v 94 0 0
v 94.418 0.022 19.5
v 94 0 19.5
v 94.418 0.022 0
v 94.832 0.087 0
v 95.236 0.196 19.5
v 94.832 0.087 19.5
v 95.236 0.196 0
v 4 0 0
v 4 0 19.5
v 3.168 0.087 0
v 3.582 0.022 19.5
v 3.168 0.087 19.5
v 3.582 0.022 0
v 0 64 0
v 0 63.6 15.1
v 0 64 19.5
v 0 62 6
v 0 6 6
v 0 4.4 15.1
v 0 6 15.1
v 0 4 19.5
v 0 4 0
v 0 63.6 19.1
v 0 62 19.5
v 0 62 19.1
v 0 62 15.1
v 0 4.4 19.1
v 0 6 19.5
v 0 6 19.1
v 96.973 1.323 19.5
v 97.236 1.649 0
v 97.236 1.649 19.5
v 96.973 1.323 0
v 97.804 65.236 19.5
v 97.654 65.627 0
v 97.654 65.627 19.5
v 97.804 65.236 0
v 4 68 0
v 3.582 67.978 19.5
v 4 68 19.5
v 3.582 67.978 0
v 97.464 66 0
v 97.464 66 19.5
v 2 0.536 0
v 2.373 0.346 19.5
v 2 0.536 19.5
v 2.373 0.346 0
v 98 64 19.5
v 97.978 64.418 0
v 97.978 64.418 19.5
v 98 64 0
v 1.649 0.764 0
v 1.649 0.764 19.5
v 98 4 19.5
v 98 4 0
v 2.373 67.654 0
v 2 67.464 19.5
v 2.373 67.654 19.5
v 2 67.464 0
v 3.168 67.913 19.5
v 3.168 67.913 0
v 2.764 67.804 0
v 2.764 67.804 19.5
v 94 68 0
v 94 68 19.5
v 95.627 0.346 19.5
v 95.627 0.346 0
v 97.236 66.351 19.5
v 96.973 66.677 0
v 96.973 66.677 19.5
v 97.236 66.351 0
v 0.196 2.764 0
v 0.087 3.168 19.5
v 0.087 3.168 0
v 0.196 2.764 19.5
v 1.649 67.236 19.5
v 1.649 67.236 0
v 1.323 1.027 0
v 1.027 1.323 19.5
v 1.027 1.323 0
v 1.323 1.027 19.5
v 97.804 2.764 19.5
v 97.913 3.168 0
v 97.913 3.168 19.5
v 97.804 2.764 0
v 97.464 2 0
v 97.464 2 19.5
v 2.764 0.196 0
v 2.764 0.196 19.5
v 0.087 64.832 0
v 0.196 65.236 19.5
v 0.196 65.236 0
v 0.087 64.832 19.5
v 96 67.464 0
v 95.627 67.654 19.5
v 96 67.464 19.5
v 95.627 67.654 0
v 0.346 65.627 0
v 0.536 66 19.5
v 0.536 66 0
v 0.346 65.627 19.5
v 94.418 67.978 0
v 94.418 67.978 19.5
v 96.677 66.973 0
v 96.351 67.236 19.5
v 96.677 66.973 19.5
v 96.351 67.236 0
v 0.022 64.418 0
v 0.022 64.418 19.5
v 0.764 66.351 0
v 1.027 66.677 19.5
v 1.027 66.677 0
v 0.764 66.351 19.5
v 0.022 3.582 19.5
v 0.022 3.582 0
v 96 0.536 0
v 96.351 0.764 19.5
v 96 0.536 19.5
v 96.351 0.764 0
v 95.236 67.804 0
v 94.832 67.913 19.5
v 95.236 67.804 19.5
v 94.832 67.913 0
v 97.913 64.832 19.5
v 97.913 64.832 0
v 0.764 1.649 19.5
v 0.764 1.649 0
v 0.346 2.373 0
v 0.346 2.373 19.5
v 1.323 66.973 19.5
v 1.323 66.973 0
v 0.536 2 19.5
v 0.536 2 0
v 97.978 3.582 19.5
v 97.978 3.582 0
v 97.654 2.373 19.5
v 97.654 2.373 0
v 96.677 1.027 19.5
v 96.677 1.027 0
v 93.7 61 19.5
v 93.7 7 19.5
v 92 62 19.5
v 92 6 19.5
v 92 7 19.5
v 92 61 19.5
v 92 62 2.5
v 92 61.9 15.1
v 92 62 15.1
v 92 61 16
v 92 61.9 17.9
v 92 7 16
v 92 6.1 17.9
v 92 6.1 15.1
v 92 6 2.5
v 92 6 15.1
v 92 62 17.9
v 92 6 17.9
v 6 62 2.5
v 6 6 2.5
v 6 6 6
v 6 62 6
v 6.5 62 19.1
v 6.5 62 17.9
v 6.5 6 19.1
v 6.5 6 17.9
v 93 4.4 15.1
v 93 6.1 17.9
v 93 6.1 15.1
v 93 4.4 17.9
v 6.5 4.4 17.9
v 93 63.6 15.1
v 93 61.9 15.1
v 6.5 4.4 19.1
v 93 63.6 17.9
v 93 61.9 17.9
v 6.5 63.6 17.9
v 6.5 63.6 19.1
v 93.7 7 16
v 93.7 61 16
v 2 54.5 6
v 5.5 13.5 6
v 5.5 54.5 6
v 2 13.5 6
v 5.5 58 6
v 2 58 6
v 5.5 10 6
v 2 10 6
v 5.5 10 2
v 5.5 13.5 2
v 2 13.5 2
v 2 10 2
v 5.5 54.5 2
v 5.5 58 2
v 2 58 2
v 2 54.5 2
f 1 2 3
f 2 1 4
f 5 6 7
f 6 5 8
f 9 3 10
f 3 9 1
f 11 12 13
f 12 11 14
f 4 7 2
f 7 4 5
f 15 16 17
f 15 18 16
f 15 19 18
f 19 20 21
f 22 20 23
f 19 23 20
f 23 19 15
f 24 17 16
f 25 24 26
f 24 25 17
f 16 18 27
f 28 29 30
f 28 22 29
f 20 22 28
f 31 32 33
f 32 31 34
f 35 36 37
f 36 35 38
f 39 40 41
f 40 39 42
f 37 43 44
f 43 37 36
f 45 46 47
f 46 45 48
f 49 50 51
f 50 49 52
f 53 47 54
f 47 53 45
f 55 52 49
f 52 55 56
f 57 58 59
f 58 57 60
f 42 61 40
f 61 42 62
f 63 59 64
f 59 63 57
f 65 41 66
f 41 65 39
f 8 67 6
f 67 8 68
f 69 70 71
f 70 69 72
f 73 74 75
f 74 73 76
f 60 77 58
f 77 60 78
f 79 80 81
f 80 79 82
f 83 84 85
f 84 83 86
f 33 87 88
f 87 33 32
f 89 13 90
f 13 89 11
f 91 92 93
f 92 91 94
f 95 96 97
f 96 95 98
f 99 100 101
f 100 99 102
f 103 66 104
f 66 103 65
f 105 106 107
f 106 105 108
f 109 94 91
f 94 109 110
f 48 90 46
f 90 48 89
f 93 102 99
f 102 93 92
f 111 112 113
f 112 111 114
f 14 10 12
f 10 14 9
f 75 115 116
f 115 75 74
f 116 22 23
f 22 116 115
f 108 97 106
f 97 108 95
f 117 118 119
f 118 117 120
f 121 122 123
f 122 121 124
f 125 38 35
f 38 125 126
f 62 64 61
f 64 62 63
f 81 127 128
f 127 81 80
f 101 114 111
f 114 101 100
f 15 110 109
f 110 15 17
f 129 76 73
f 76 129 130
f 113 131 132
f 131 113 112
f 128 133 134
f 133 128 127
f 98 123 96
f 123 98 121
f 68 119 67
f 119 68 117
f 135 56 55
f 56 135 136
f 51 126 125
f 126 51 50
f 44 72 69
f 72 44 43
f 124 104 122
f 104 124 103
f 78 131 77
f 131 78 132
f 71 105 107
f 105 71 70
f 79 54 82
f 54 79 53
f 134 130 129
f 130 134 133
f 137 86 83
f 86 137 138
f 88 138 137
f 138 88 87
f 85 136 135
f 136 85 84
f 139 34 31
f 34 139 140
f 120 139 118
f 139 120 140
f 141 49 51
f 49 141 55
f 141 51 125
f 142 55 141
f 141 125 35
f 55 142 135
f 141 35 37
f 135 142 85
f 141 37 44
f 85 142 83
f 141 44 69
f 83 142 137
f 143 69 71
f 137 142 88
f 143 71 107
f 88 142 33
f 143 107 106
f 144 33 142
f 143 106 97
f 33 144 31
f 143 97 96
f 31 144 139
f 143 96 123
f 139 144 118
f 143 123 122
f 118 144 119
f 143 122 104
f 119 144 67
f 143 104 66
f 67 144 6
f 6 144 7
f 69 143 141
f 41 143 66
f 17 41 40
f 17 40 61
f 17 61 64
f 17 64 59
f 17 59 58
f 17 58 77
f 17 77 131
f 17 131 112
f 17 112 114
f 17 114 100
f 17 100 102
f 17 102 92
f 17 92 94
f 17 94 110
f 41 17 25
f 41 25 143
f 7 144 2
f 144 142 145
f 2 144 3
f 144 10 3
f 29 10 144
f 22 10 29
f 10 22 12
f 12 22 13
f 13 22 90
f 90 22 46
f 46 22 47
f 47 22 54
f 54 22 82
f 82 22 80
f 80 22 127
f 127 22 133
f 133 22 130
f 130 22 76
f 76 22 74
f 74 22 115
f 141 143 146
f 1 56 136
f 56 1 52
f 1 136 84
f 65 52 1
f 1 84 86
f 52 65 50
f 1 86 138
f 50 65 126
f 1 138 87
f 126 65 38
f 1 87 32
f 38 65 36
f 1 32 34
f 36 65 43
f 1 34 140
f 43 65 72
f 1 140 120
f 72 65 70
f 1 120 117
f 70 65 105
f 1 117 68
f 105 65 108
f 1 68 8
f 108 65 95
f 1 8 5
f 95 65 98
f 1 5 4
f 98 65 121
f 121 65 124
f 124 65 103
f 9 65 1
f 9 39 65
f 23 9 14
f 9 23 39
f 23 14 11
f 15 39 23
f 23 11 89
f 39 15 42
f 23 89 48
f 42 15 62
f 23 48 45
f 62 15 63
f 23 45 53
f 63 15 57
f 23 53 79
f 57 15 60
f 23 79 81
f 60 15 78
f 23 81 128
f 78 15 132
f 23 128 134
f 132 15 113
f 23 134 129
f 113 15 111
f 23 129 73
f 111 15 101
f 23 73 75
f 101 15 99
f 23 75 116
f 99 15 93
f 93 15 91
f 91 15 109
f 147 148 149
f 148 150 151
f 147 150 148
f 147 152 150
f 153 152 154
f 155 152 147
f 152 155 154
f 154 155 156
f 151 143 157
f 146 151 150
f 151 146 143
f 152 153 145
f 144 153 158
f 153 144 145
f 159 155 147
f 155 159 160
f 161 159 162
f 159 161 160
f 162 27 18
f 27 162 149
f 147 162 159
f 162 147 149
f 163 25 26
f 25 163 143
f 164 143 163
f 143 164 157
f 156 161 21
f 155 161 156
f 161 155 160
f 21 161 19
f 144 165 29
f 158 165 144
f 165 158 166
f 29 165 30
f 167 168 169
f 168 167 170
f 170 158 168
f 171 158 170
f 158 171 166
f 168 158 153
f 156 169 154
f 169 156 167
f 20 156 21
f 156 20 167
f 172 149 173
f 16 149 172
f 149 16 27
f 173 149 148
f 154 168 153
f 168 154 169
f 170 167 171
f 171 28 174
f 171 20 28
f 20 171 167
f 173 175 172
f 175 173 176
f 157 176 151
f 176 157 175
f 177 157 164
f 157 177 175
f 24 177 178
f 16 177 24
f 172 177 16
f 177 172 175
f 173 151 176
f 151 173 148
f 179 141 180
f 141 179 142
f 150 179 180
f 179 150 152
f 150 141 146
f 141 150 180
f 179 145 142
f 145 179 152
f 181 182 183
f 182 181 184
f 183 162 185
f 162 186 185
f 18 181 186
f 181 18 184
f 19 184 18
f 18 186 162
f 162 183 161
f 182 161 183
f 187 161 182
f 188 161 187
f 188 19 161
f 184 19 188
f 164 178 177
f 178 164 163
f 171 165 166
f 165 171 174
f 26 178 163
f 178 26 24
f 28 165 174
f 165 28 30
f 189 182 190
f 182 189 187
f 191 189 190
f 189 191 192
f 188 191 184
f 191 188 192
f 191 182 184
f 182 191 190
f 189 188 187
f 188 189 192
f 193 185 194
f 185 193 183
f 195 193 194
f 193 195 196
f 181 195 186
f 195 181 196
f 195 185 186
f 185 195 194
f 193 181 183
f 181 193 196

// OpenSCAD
// =============================================================================
// OpenMotorBridge - Front Node: Monocoque Base Tub (v10.0 Slot-In)
// =============================================================================
// File: hardware/cad/scad/04_front_node/parts/000_front_node_base_tub.scad
// Description: Monolithic PA12-MJF monocoque enclosure tub for the Universal
//              Front Node (Gehäuse Typ E: 98 x 68 x 22 mm).
//              Implements the v10 Monocoque Slot-In architecture:
//              - 100% solid, leak-free bottom floor with 4-in-1 mounting system.
//              - Longitudinal C-profile guide rails (Z = 16.5 mm) along North & South.
//              - Solid PA12 retaining roof lips (Z = 17.9..19.5 mm) for form-fit hold-down.
//              - Front wedge-lock pocket (Keilanzug-Nut) at East wall (X = 98 mm).
//              - Rear insertion portal at West wall (X = 0 mm, Z = 6.0..19.5 mm).
// =============================================================================

include <../../00_common/parameters.scad>;

module front_node_base_tub(
    length   = FRONT_NODE_OUTER_L,
    width    = FRONT_NODE_OUTER_W,
    height   = FRONT_NODE_TUB_H,
    corner_r = FRONT_NODE_CORNER_R,
    wall     = FRONT_NODE_WALL
) {
    ch_x_start = wall + 3.5; // 6.0 mm
    ch_y_start = wall + 3.5; // 6.0 mm

    difference() {
        // 1. Solid Outer Block with Rounded Vertical Corners
        linear_extrude(height = height) {
            offset(r = corner_r) {
                offset(delta = -corner_r) {
                    square([length, width], center=false);
                }
            }
        }

        // 2. Hollow Internal Chamber (clears PCBA 05 and internal wiring)
        translate([ch_x_start, ch_y_start, wall]) {
            cube(size=[FRONT_NODE_CHAMBER_L, FRONT_NODE_CHAMBER_W, height - wall + 1.0], center=false);
        }

        // 3. Longitudinal C-Profile Guide Rails (Z = 16.5 mm)
        // A. South Guide Groove into South Wall (Y = 6.0 - 1.6 .. 6.0 mm)
        translate([ch_x_start - 1.0, ch_y_start - FRONT_NODE_RAIL_DEPTH, FRONT_NODE_RAIL_Z - FRONT_NODE_RAIL_H/2.0]) {
            cube([FRONT_NODE_CHAMBER_L + 2.0, FRONT_NODE_RAIL_DEPTH + 0.1, FRONT_NODE_RAIL_H], center=false);
        }

        // B. North Guide Groove into North Wall (Y = 62.0 .. 62.0 + 1.6 mm)
        translate([ch_x_start - 1.0, ch_y_start + FRONT_NODE_CHAMBER_W - 0.1, FRONT_NODE_RAIL_Z - FRONT_NODE_RAIL_H/2.0]) {
            cube([FRONT_NODE_CHAMBER_L + 2.0, FRONT_NODE_RAIL_DEPTH + 0.1, FRONT_NODE_RAIL_H], center=false);
        }

        // 4. Front Wedge-Lock Undercut Pocket (Keilanzug-Nut into East Wall at X = 92.0 mm)
        translate([ch_x_start + FRONT_NODE_CHAMBER_L - 0.1, ch_y_start + 1.0, FRONT_NODE_RAIL_Z - 0.5]) {
            cube([1.8, FRONT_NODE_CHAMBER_W - 2.0, FRONT_NODE_RAIL_H + 1.0], center=false);
        }

        // 5. Rear Insertion Portal Opening at West Wall (X = 0 mm, Z = 6.0..19.5 mm)
        translate([-0.5, ch_y_start, FRONT_NODE_REAR_SILL_H]) {
            cube([ch_x_start + 1.0, FRONT_NODE_CHAMBER_W, height - FRONT_NODE_REAR_SILL_H + 1.0], center=false);
        }

        // Throat expansion for C-rail lead-in at West portal
        translate([-0.5, ch_y_start - FRONT_NODE_RAIL_DEPTH, FRONT_NODE_RAIL_Z - FRONT_NODE_RAIL_H/2.0]) {
            cube([ch_x_start + 1.0, FRONT_NODE_CHAMBER_W + 2*FRONT_NODE_RAIL_DEPTH, height - FRONT_NODE_RAIL_Z + 1.0], center=false);
        }

        // 6. Dual Deadbolt Latch Sockets on Lower Sill (West, X = 2.0..5.0 mm, Z = 1.5..5.5 mm)
        translate([2.0, ch_y_start + 4.0, FRONT_NODE_REAR_SILL_H - 4.0]) {
            cube([3.5, 3.5, 4.5], center=false);
        }
        translate([2.0, ch_y_start + FRONT_NODE_CHAMBER_W - 7.5, FRONT_NODE_REAR_SILL_H - 4.0]) {
            cube([3.5, 3.5, 4.5], center=false);
        }
    }
}

// Standalone preview
front_node_base_tub();
